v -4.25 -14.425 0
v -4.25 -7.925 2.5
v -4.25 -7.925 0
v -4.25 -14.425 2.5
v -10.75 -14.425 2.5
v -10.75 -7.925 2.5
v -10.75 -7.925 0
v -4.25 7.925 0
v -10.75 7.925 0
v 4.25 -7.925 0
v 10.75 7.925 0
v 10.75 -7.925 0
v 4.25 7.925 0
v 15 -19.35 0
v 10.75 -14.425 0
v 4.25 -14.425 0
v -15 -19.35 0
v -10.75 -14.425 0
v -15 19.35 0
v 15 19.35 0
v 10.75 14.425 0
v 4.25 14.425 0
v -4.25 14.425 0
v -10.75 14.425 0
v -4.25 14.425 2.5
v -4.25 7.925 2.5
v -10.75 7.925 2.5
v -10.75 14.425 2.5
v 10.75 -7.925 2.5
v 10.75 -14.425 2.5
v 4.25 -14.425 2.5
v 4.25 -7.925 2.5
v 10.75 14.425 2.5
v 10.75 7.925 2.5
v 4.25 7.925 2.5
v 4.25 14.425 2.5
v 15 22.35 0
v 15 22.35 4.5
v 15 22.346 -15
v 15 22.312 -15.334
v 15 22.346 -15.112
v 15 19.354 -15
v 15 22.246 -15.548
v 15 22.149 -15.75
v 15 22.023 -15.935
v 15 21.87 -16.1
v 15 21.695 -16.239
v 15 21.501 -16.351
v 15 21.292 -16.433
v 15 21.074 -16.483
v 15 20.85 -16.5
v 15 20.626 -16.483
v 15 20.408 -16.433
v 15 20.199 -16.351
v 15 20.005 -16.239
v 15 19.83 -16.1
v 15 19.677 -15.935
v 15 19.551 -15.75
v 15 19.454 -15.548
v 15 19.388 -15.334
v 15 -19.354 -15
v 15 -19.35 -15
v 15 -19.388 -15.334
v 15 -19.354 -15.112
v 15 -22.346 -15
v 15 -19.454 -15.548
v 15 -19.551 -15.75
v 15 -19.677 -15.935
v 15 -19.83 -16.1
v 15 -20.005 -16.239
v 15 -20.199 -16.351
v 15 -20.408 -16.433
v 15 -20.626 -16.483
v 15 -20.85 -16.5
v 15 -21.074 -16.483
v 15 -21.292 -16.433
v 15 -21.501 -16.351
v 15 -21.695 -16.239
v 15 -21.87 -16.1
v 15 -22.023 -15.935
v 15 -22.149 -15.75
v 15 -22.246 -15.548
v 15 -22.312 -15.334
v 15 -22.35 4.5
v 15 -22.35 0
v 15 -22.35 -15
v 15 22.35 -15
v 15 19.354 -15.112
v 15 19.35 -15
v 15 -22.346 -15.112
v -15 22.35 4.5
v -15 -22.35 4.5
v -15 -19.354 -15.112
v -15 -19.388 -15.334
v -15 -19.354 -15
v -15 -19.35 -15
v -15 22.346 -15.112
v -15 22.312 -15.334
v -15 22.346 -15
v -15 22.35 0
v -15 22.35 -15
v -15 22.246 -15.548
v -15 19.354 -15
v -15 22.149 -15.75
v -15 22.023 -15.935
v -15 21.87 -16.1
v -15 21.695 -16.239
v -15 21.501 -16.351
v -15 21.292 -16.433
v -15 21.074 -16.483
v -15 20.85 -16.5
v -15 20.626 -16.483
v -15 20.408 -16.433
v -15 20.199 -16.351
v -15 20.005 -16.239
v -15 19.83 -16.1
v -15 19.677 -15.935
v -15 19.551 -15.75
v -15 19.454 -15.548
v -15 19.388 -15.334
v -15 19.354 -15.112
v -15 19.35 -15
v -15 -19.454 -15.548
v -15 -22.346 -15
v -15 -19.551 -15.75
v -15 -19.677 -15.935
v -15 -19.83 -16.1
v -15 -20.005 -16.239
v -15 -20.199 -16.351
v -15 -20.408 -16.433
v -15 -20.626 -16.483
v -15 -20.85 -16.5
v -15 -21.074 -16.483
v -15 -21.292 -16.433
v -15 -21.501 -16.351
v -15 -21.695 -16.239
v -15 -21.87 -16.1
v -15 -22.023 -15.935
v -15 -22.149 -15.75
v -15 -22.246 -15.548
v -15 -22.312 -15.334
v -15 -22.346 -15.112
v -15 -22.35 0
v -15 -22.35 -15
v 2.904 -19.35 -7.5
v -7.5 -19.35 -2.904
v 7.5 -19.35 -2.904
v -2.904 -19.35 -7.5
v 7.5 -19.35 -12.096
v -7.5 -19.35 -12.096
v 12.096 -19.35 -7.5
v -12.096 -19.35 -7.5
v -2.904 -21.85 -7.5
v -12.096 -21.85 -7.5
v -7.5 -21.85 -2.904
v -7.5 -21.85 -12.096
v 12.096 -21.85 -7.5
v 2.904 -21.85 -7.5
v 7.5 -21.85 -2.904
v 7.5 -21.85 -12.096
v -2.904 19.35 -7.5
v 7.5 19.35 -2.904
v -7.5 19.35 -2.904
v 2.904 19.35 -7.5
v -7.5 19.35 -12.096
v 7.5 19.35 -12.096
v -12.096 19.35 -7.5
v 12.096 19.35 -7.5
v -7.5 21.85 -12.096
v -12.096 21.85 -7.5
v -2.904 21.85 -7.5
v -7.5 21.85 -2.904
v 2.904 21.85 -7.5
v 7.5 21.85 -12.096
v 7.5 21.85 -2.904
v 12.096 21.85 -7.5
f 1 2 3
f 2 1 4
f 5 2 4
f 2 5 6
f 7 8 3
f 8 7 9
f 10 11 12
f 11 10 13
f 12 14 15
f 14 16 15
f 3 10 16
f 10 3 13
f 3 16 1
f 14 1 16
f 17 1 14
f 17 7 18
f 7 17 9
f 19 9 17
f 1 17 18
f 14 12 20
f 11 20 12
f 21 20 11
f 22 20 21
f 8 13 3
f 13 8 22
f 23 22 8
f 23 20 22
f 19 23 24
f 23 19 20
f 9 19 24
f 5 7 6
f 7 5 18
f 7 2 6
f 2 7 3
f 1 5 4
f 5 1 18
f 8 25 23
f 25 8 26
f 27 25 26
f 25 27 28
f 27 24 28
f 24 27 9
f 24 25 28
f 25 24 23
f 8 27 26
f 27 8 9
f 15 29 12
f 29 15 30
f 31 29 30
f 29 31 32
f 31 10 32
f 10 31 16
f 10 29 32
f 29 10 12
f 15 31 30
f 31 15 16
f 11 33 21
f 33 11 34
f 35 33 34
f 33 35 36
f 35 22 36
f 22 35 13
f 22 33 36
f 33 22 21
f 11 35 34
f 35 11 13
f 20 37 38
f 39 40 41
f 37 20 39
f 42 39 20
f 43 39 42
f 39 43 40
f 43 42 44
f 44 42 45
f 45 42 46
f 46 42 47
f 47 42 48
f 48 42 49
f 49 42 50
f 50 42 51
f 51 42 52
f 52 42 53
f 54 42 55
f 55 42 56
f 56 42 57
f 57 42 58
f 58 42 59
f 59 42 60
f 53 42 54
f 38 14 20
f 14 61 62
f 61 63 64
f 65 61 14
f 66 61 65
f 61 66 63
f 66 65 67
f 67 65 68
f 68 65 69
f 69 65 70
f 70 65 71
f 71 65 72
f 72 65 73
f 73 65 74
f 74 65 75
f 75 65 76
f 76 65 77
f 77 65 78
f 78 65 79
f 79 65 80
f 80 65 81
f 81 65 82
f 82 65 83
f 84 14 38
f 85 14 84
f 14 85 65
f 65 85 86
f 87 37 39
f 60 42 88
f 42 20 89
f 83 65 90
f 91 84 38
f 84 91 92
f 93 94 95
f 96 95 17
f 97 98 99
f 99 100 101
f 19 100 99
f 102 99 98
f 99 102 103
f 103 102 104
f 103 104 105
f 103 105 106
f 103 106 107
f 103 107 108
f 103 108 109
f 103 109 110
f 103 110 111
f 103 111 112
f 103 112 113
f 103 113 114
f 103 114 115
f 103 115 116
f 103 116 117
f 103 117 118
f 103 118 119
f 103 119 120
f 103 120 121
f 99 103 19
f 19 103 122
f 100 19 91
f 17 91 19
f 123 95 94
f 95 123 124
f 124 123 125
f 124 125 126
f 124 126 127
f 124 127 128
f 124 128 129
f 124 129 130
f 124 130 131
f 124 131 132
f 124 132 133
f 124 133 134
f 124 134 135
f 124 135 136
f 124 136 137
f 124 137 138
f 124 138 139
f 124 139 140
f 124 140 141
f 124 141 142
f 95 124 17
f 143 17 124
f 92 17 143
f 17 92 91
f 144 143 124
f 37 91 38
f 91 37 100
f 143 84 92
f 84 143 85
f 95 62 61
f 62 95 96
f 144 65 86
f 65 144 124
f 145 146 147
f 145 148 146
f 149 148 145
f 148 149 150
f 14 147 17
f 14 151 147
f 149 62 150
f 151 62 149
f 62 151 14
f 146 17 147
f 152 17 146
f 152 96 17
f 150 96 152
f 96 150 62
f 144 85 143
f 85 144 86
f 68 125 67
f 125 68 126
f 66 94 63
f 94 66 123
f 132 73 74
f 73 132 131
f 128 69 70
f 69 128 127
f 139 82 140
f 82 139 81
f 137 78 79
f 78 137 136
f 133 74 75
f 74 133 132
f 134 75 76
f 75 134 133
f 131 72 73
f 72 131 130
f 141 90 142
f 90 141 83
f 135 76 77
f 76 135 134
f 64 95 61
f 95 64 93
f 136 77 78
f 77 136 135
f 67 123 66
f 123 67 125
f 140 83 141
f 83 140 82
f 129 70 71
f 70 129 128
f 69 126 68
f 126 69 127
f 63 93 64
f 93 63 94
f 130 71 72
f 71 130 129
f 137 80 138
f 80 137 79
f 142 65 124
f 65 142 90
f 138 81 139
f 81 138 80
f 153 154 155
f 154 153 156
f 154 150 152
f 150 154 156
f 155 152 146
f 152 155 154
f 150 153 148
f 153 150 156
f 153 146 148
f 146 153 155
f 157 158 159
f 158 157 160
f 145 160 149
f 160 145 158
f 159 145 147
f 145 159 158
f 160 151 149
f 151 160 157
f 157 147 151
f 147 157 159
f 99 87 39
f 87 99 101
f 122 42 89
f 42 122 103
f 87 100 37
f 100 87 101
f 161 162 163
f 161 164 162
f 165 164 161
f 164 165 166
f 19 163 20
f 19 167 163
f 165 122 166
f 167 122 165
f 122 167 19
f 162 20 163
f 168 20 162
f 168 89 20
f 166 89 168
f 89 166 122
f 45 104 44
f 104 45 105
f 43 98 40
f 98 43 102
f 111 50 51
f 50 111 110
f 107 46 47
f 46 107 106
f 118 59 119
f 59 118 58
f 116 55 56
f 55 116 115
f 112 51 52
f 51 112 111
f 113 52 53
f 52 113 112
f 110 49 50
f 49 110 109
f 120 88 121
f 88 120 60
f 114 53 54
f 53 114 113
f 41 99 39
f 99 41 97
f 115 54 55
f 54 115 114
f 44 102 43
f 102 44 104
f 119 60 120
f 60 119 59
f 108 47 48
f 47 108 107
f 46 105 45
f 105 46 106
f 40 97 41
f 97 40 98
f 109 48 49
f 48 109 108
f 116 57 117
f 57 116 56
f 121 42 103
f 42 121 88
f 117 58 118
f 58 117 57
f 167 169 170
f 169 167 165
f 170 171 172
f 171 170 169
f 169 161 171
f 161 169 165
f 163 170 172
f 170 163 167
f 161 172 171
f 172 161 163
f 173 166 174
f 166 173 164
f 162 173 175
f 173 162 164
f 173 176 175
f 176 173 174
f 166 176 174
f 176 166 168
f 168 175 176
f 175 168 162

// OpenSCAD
// thickness of the bed head bar in mm
bedhead_depth = 38.7;

// width of the magnet in mm (if round use diameter)
magnetWidth = 6.5;
// depth of the magnet in mm (if round use diameter)
magnetDepth = 6.5;
// height of the magnet in mm
magnetHeight = 2.5;

// thickness of the grip arms in mm
gripWidth = 3;
// height of the grip arms in mm (default is 5 times the thickness)
gripHeight = gripWidth * 5;

// width of the holder in mm
baseWidth = 30;
// depth of the holder in mm (default is thickness of bed head bar plus 2 times thickness of the grip arms)
baseDepth = bedhead_depth + 2 * gripWidth;
// height of the holder in mm (default is height of the magnet plus 2mm)
baseHeight = magnetHeight + 2;

module fakeBeadHead() {
    width = 500;
    height = 200;
    translate([0, 0, -half(height)])
        %cube([width, bedhead_depth, height], true);
}

module magneticBase() {
    difference() {
        translate([0, 0, half(baseHeight)]) {
            cube([baseWidth, baseDepth, baseHeight], true);
        }
        for (directionX = [-1, 1]) {
            for (directionY = [-1, 1]) {
                translate([directionX * quarter(baseWidth), directionY * quarter(baseDepth), half(magnetHeight)]) {
                    #cube([magnetWidth, magnetDepth, magnetHeight], true);
                }
            }
        }
    }
    for (direction = [-1, 1]) {
        difference() {
            translate([0, (direction*half(baseDepth))-(direction*half(gripWidth)), 0]) {
                translate([0, 0, -(gripHeight/2)]) {
                    cube([baseWidth, gripWidth, gripHeight], true);
                }
                translate([0, 0, -(gripHeight)]) {
                    rotate([0, 90, 0]) {
                        cylinder(h = baseWidth, d = gripWidth, center = true, $fn = 42);
                    }
                }
            }
            for (dirX = [-1, 1]) {
                translate([dirX*half(half(baseWidth)), direction*(half(bedhead_depth)+half(magnetHeight)), -half(gripHeight)]) {
                    rotate([90, 0, 0]) { rotate([0, 0, 45]) {
                        #cube([magnetWidth, magnetDepth, magnetHeight], true);
                    }}
                }
            }
        }
    }
}

fakeBeadHead();
magneticBase();

function half(value) = value / 2;
function quarter(value) = value / 4;
